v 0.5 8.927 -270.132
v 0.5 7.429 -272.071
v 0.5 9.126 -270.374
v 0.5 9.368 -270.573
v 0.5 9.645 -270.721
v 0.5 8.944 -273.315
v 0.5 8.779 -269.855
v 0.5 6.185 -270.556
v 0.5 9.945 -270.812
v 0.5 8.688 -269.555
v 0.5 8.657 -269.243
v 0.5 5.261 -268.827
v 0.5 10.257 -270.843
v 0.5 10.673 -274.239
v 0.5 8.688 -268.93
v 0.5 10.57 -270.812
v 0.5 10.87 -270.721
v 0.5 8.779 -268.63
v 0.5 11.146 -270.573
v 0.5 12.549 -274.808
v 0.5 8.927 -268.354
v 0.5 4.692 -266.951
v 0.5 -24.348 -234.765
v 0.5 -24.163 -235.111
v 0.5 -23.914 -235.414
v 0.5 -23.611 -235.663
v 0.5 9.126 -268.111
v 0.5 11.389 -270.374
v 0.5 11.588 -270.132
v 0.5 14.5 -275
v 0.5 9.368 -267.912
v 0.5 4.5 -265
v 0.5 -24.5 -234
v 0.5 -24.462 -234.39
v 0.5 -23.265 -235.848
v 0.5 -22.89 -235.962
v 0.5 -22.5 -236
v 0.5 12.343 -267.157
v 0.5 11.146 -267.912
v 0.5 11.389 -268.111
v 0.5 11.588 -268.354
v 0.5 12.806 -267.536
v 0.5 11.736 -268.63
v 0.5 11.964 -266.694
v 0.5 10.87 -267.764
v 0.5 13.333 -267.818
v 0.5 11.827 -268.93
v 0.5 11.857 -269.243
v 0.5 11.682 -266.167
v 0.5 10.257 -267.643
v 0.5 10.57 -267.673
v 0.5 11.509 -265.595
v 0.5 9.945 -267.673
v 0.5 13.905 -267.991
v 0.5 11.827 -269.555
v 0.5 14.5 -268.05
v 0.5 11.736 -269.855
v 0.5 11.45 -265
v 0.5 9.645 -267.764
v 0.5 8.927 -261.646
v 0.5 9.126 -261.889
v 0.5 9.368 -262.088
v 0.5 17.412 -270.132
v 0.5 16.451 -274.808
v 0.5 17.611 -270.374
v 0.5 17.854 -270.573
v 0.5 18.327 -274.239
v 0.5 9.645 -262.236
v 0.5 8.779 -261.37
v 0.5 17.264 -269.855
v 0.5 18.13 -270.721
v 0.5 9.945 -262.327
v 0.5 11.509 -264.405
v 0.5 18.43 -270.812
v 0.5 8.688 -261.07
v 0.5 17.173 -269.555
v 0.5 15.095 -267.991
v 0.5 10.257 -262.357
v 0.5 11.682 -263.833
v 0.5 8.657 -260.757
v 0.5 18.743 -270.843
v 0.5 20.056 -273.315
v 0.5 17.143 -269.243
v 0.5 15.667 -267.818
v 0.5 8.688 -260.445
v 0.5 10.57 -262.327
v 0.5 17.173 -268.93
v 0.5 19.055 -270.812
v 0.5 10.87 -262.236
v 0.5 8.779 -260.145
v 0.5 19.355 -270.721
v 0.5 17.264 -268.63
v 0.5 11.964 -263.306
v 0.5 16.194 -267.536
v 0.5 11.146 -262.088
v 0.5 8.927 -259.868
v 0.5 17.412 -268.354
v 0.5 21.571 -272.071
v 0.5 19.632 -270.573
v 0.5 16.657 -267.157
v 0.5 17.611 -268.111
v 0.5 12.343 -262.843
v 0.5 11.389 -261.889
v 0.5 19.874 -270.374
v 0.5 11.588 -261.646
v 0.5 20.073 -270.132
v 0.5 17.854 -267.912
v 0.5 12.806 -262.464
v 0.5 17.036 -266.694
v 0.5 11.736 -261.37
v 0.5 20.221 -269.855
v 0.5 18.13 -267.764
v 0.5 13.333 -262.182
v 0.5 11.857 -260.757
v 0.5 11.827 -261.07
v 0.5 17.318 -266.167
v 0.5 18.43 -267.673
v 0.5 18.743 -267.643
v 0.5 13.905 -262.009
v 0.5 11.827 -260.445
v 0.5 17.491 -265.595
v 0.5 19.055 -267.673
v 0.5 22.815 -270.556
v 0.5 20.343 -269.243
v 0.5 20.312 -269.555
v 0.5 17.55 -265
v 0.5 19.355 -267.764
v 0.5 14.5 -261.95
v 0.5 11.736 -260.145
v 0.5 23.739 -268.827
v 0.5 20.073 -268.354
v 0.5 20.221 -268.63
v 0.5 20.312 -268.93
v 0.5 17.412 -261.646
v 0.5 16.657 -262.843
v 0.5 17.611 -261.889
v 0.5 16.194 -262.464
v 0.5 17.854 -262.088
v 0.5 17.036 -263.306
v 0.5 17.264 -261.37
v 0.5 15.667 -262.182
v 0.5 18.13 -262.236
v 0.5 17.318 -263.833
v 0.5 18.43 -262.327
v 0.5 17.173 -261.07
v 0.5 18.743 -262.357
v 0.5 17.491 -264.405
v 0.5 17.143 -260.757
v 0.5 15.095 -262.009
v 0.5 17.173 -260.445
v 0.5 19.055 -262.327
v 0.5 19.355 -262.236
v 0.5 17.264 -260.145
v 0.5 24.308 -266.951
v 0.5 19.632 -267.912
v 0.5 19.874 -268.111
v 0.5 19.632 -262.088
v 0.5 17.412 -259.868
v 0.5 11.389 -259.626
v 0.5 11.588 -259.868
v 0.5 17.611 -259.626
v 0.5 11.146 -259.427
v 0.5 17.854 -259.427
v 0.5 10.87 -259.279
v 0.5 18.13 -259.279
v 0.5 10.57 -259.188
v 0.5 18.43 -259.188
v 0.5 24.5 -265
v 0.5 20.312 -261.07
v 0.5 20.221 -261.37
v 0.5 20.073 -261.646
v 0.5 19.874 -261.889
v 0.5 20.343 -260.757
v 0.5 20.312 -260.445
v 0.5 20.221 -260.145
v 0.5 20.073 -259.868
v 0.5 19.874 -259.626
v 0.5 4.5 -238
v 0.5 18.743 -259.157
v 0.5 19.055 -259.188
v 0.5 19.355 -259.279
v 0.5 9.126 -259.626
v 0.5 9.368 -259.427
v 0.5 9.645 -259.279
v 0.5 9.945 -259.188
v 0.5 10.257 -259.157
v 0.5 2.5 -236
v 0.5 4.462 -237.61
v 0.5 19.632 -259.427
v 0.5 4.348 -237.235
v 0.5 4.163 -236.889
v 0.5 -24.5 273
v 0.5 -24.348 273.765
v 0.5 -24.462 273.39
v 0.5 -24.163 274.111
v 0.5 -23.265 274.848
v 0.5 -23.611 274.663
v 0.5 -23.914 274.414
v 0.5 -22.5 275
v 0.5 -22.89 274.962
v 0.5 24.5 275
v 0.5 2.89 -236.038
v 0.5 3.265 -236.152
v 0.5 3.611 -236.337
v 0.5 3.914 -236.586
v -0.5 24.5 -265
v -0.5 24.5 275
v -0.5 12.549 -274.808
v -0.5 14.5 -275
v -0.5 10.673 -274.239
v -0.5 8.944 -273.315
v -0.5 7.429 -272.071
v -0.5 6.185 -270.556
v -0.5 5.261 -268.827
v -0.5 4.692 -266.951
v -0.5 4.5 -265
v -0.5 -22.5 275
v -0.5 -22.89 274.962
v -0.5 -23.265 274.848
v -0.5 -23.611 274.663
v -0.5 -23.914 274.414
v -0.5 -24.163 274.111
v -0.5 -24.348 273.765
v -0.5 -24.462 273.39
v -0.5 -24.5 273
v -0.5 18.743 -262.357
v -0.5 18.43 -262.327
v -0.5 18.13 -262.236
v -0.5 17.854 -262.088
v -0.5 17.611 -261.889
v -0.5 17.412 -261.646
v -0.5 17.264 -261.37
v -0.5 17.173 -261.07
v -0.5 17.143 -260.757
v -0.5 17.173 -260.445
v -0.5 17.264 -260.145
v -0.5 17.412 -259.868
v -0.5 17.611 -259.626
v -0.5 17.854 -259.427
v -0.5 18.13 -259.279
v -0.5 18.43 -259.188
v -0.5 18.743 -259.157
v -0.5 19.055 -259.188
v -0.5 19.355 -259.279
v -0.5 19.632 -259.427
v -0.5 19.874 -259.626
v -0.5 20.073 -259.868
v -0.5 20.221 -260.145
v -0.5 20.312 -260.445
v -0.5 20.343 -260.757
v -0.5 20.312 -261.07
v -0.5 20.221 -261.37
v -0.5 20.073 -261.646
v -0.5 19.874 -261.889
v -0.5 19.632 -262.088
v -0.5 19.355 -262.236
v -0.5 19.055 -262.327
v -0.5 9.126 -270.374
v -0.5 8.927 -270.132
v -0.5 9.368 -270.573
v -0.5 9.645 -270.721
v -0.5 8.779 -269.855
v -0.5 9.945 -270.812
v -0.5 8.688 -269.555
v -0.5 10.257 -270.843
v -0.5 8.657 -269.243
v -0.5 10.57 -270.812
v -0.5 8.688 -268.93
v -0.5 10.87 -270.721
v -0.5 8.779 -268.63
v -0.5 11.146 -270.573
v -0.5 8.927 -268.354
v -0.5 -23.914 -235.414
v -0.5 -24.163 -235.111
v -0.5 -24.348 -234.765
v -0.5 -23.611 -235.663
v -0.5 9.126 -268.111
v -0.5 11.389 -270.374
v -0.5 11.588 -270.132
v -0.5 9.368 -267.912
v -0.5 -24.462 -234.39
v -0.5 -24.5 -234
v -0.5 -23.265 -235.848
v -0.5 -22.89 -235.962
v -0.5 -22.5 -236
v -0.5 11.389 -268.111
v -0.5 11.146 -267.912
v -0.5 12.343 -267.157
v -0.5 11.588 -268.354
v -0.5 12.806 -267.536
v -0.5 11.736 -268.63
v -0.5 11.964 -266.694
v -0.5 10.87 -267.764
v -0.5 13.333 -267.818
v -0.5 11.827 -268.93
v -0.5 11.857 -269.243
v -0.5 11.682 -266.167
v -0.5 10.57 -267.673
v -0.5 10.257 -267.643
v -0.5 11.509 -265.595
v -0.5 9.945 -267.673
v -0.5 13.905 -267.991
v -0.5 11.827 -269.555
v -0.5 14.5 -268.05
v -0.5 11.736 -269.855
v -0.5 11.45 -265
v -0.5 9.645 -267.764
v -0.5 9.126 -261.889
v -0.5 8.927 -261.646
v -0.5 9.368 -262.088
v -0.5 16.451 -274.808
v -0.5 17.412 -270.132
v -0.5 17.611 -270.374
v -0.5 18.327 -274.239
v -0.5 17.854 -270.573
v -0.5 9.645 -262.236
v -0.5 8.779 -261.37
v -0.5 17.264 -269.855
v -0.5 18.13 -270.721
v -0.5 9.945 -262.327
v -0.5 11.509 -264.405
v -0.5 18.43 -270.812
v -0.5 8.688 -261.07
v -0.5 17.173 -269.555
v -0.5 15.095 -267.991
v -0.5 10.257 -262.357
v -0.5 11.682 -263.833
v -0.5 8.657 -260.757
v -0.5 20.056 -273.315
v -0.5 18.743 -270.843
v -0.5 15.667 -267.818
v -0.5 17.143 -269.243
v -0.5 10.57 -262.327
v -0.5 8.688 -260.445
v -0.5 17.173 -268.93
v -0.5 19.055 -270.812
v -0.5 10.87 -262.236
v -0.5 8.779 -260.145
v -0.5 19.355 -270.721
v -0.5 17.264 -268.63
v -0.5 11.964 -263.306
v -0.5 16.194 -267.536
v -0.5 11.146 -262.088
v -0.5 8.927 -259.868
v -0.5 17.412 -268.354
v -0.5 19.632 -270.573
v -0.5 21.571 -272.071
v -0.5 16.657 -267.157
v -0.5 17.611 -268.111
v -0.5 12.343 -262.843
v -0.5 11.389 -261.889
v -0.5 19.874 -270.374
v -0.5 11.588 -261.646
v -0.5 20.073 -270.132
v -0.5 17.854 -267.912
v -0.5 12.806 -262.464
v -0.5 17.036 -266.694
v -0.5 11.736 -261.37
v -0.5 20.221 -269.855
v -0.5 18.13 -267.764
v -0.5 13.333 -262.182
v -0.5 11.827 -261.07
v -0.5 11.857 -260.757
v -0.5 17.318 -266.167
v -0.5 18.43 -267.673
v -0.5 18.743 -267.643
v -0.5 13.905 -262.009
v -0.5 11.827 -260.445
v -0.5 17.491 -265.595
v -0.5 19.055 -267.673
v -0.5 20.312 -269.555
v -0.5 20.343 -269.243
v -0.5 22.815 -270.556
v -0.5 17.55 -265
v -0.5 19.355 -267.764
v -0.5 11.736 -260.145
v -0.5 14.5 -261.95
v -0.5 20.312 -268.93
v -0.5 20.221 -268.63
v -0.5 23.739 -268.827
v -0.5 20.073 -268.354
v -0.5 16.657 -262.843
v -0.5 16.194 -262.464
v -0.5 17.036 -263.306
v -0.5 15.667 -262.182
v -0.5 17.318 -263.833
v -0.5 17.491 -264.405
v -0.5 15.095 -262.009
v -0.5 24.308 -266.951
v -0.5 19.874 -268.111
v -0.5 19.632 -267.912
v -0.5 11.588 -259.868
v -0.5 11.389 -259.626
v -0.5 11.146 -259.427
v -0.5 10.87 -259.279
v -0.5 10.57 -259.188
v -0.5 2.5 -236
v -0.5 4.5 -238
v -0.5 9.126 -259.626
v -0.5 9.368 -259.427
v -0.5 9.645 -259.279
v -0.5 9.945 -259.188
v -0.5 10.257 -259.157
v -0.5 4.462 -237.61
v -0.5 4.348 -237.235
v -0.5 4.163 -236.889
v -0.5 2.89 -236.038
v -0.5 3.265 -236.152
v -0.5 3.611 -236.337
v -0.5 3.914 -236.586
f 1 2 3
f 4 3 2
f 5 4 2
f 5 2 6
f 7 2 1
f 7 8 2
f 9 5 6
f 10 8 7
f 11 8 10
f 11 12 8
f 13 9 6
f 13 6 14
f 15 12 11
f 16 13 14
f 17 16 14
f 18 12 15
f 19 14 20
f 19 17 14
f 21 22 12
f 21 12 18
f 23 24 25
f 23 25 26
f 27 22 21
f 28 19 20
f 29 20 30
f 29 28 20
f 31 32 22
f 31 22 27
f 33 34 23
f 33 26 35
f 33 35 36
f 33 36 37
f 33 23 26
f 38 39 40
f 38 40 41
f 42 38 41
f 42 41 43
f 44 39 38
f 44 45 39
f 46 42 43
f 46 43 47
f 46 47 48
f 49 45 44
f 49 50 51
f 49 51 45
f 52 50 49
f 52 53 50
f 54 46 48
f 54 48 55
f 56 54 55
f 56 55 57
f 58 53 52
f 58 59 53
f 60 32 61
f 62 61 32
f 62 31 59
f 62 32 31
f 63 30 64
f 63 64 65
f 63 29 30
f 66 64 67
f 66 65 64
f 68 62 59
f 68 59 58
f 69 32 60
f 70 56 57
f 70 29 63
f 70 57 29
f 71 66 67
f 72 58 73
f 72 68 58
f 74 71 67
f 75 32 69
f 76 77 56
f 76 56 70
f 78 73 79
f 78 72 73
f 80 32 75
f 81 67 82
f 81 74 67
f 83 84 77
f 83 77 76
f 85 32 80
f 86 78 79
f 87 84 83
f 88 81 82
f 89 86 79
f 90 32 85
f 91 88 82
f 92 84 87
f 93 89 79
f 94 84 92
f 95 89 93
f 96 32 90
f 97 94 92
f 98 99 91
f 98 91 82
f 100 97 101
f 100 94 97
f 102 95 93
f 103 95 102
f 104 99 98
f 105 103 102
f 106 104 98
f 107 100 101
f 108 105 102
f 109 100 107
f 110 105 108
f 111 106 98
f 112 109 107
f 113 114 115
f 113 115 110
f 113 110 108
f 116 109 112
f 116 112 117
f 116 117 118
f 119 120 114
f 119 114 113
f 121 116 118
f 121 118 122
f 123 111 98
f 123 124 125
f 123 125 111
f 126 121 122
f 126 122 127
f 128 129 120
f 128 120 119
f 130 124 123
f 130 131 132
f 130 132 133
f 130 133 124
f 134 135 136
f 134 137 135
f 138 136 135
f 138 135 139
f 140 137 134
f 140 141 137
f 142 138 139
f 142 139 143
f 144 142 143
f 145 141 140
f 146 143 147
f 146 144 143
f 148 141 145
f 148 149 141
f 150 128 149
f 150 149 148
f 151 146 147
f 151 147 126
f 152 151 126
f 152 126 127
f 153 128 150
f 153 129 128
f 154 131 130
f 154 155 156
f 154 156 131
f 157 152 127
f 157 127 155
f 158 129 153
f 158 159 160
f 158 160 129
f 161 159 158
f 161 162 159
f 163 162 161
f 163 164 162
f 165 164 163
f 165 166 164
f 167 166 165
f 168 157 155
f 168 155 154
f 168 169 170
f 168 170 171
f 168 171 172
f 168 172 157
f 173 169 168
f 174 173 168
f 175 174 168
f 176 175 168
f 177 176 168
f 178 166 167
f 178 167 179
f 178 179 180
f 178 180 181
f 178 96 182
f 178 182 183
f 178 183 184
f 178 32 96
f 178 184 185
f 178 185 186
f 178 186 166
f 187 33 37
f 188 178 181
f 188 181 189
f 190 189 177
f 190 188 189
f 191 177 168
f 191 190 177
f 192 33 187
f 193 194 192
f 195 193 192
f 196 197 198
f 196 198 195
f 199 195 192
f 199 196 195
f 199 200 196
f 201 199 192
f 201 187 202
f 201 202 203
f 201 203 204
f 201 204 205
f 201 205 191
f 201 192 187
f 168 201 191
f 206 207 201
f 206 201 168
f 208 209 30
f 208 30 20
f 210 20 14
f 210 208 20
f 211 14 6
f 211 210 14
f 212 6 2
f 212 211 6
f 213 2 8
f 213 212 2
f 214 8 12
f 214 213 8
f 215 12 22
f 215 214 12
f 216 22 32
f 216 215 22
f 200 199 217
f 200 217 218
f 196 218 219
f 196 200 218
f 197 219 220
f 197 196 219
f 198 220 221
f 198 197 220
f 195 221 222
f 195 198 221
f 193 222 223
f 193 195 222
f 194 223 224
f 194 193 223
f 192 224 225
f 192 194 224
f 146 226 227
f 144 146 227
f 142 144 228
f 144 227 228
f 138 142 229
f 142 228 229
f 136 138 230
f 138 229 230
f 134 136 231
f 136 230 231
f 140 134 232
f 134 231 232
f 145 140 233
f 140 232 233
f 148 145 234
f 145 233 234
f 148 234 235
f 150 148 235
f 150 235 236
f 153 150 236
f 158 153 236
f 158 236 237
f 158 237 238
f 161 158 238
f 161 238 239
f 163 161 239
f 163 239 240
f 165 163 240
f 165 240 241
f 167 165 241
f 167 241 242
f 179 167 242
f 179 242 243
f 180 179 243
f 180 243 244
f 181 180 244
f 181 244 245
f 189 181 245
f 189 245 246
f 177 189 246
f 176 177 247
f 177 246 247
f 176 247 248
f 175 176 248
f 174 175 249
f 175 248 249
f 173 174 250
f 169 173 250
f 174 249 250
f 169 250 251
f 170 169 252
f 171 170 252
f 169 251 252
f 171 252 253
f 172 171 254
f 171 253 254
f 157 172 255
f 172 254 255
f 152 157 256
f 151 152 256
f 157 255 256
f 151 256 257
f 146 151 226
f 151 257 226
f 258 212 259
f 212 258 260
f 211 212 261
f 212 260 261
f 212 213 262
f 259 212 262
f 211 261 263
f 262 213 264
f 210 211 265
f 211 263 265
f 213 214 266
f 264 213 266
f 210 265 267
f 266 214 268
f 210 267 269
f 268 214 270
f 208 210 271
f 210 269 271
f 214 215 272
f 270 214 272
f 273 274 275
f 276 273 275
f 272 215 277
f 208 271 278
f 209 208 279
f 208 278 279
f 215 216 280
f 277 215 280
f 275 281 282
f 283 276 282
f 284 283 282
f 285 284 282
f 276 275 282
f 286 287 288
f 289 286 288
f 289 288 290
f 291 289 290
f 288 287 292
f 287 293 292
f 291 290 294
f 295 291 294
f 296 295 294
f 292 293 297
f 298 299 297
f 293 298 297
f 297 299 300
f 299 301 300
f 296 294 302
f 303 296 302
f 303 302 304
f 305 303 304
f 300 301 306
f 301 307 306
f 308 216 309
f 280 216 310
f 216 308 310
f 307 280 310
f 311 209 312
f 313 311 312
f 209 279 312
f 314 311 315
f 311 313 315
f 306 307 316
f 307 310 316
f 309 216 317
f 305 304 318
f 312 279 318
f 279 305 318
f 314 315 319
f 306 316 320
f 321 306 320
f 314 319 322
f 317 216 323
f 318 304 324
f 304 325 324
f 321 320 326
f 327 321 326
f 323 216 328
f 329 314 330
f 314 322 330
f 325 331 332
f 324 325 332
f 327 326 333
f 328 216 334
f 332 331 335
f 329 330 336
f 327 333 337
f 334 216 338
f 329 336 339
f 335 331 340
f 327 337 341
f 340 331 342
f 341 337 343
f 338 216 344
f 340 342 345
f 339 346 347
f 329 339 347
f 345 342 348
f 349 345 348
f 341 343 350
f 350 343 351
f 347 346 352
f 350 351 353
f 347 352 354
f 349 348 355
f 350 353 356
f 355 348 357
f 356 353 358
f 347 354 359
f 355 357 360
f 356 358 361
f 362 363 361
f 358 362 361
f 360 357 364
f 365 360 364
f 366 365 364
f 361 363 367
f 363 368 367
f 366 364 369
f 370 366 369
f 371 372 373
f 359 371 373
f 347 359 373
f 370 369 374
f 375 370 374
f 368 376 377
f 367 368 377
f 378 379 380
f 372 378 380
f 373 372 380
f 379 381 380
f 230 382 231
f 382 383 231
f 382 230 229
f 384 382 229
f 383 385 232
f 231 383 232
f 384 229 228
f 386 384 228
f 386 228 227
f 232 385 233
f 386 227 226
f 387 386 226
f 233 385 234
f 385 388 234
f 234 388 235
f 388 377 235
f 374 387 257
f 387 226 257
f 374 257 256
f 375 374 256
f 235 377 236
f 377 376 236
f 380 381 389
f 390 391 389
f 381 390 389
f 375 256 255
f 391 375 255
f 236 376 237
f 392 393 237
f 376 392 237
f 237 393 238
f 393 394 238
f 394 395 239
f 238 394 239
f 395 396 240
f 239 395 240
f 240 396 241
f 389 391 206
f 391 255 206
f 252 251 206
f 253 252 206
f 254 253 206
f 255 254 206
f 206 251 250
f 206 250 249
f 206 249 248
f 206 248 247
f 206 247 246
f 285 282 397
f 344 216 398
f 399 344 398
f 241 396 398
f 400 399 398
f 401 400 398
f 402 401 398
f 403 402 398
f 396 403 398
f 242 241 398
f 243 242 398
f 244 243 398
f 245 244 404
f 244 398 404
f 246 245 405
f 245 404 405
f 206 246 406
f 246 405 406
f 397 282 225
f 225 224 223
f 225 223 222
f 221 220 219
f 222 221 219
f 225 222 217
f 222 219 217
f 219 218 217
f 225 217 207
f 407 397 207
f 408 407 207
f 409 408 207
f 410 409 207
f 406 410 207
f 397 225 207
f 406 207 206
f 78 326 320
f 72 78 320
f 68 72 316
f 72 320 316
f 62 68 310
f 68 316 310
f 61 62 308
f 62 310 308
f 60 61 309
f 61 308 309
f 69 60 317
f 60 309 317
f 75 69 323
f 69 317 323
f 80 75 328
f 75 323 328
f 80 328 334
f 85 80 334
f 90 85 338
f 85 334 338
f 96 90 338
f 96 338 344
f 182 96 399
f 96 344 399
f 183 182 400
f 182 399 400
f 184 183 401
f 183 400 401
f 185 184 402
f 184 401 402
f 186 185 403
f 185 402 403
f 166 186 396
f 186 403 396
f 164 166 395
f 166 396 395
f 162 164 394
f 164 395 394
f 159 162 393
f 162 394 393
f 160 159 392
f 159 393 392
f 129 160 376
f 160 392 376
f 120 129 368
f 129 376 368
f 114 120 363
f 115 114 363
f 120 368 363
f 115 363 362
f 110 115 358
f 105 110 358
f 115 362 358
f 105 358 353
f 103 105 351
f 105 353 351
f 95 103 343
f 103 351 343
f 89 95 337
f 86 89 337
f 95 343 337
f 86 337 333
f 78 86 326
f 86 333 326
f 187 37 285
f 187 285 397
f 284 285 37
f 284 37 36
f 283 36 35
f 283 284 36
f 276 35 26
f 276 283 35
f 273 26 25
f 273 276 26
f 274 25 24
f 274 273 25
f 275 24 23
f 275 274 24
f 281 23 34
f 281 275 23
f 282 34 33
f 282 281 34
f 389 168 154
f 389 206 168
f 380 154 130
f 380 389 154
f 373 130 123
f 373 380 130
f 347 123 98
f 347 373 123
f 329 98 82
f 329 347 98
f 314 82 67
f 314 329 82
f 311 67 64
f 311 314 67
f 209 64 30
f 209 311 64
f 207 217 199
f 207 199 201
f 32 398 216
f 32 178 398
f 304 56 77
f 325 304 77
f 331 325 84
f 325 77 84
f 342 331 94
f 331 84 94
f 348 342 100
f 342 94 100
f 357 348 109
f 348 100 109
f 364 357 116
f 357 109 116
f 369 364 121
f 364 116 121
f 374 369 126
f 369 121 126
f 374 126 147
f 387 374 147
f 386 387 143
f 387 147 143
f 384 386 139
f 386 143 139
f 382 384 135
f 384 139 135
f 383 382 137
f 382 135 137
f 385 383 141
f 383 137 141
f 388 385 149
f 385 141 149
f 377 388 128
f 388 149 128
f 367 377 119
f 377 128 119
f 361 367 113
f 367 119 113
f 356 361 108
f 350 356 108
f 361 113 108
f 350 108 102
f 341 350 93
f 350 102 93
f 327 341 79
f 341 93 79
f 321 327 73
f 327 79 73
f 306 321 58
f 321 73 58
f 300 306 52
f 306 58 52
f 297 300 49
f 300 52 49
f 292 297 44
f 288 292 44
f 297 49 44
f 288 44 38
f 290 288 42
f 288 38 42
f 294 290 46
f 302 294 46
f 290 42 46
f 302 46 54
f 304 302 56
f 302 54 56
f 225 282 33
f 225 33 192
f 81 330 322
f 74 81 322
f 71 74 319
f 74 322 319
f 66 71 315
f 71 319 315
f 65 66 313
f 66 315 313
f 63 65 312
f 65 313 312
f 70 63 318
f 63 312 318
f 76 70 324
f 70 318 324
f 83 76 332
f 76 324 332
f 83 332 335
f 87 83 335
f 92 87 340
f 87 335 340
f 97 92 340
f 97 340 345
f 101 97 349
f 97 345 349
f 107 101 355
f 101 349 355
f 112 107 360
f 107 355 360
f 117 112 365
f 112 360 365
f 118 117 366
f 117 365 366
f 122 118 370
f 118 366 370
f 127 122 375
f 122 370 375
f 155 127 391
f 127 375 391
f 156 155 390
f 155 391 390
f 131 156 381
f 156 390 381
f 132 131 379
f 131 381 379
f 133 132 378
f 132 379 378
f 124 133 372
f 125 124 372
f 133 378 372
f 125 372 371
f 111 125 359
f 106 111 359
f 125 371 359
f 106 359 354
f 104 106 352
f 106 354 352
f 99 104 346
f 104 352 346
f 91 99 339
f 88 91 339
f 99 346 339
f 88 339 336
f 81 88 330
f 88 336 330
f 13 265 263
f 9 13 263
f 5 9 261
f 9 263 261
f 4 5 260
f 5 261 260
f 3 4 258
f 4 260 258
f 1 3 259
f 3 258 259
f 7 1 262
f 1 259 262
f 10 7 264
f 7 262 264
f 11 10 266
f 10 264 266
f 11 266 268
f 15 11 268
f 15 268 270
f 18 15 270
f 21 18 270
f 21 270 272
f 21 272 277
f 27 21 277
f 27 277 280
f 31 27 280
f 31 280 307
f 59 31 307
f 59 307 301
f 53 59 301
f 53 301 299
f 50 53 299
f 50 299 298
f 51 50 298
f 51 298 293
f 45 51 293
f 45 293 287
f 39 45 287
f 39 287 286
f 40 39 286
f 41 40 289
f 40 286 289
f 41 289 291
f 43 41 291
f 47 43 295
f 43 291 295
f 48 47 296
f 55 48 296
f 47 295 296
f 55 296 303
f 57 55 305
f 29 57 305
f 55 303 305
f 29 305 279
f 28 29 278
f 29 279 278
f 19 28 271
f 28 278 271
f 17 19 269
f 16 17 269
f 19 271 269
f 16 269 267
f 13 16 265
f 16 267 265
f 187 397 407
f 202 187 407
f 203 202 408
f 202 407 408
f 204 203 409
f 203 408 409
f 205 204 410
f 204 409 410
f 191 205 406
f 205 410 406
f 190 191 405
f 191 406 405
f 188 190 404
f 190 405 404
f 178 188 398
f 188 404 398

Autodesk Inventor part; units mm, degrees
ref_plane "YZ Plane" through (0, 0, 0) normal (1, 0, 0) x (0, 1, 0)
ref_plane "XZ Plane" through (0, 0, 0) normal (0, 1, 0) x (-1, 0, 0)
ref_plane "XY Plane" through (0, 0, 0) normal (0, 0, 1) x (1, 0, 0)
sketch "スケッチ1" plane through (0, 0, 0) normal (1, 0, 0) x (0, 1, 0)
  line L0 (-24.5, 275) -> (24.5, 275)
  line L1 (24.5, 275) -> (24.5, -275)
  line L2 (24.5, -275) -> (-24.5, -275)
  line L3 (-24.5, -275) -> (-24.5, 275)
  line L4 (-24.5, 275) -> (24.5, -275) construction
  line L5 (24.5, 275) -> (-24.5, -275) construction
  point P0 (0, 0)
  dimension "d0" = 49
  dimension "d1" = 550
extrude "プレート1" add sketch "スケッチ1" along normal mid plane 1
sketch "スケッチ3" plane through (0.5, 0, 0) normal (1, 0, 0) x (0, 0, -1)
  circle A0 centre (265, 14.5) radius 6
  line L0 (275, 24.5) -> (275, -24.5) projected
  line L1 (-275, 24.5) -> (275, 24.5) projected
  point P0 (0, 0)
  point P1 (269.2426, 18.7426)
  point P2 (260.7574, 18.7426)
  point P3 (260.7574, 10.2574)
  point P4 (269.2426, 10.2574)
  dimension "d13" = 12
  dimension "d14" = 10
  dimension "d15" = 10
  dimension "d18" = 360
  dimension "d30" = 0
hole "穴2" at (0.5, 18.7426, -269.2426) at (0.5, 18.7426, -260.7574) at (0.5, 10.2574, -260.7574) at (0.5, 10.2574, -269.2426) direction (-1, 0, 0) diameter 3.2 end through all clearance for "Socket Head Cap Screw" size "M3" standard "Ansi Metric M Profile"
sketch "スケッチ4" plane through (0.5, 0, 0) normal (1, 0, 0) x (0, 0, -1)
  circle A0 centre (265, 14.5) radius 3.05
  point P0 (0, 0)
  dimension "d27" = 6.1
extrude "押し出し1" cut sketch "スケッチ4" against normal blind 10
sketch "スケッチ5" plane through (0.5, 0, 0) normal (1, 0, 0) x (0, 0, -1)
  line L0 (275, -24.5) -> (236, -24.5)
  line L1 (236, -24.5) -> (236, 4.5)
  line L2 (236, 4.5) -> (275, 4.5)
  line L3 (275, 4.5) -> (275, -24.5)
  line L4 (-275, 24.5) -> (216, 24.5)
  line L5 (216, 24.5) -> (216, 4.5)
  line L6 (216, 4.5) -> (-275, 4.5)
  line L7 (-275, 4.5) -> (-275, 24.5)
  line L8 (275, -24.5) -> (-275, -24.5) projected
  circle A0 centre (265, 14.5) radius 3.05 projected
  point P0 (0, 0)
  dimension "d35" = 29
  dimension "d36" = 20
  dimension "d40" = 29
  dimension "d41" = 10
extrude "押し出し2" cut sketch "スケッチ5" against normal blind 10 contours L0 L1 L2 L3
fillet "コーナーR2" radius 10 2 edges at (0, 24.5, -275) (0, 4.5, -275)
fillet "コーナーR3" radius 2 3 edges at (0, 4.5, -236) (0, -24.5, -236) (0, -24.5, 275)
equation "\"d15\" = d14"
equation "\"d25\" = Thickness"
equation "\"d2\" = Thickness"
equation "\"BendRadius\" = Thickness"
equation "\"BendReliefWidth\" = Thickness"
equation "\"BendReliefDepth\" = 0.5 * Thickness"
equation "\"CornerReliefSize\" = 4 * Thickness"
equation "\"MinimumRemnant\" = 2 * Thickness"
equation "\"TransitionRadius\" = BendRadius"
equation "\"JacobiRadiusSize\" = BendRadius"
equation "\"GapSize\" = Thickness"
equation "\"Thickness\" = 1"
properties part number "s_carbon_plate5" material "CFRP"
